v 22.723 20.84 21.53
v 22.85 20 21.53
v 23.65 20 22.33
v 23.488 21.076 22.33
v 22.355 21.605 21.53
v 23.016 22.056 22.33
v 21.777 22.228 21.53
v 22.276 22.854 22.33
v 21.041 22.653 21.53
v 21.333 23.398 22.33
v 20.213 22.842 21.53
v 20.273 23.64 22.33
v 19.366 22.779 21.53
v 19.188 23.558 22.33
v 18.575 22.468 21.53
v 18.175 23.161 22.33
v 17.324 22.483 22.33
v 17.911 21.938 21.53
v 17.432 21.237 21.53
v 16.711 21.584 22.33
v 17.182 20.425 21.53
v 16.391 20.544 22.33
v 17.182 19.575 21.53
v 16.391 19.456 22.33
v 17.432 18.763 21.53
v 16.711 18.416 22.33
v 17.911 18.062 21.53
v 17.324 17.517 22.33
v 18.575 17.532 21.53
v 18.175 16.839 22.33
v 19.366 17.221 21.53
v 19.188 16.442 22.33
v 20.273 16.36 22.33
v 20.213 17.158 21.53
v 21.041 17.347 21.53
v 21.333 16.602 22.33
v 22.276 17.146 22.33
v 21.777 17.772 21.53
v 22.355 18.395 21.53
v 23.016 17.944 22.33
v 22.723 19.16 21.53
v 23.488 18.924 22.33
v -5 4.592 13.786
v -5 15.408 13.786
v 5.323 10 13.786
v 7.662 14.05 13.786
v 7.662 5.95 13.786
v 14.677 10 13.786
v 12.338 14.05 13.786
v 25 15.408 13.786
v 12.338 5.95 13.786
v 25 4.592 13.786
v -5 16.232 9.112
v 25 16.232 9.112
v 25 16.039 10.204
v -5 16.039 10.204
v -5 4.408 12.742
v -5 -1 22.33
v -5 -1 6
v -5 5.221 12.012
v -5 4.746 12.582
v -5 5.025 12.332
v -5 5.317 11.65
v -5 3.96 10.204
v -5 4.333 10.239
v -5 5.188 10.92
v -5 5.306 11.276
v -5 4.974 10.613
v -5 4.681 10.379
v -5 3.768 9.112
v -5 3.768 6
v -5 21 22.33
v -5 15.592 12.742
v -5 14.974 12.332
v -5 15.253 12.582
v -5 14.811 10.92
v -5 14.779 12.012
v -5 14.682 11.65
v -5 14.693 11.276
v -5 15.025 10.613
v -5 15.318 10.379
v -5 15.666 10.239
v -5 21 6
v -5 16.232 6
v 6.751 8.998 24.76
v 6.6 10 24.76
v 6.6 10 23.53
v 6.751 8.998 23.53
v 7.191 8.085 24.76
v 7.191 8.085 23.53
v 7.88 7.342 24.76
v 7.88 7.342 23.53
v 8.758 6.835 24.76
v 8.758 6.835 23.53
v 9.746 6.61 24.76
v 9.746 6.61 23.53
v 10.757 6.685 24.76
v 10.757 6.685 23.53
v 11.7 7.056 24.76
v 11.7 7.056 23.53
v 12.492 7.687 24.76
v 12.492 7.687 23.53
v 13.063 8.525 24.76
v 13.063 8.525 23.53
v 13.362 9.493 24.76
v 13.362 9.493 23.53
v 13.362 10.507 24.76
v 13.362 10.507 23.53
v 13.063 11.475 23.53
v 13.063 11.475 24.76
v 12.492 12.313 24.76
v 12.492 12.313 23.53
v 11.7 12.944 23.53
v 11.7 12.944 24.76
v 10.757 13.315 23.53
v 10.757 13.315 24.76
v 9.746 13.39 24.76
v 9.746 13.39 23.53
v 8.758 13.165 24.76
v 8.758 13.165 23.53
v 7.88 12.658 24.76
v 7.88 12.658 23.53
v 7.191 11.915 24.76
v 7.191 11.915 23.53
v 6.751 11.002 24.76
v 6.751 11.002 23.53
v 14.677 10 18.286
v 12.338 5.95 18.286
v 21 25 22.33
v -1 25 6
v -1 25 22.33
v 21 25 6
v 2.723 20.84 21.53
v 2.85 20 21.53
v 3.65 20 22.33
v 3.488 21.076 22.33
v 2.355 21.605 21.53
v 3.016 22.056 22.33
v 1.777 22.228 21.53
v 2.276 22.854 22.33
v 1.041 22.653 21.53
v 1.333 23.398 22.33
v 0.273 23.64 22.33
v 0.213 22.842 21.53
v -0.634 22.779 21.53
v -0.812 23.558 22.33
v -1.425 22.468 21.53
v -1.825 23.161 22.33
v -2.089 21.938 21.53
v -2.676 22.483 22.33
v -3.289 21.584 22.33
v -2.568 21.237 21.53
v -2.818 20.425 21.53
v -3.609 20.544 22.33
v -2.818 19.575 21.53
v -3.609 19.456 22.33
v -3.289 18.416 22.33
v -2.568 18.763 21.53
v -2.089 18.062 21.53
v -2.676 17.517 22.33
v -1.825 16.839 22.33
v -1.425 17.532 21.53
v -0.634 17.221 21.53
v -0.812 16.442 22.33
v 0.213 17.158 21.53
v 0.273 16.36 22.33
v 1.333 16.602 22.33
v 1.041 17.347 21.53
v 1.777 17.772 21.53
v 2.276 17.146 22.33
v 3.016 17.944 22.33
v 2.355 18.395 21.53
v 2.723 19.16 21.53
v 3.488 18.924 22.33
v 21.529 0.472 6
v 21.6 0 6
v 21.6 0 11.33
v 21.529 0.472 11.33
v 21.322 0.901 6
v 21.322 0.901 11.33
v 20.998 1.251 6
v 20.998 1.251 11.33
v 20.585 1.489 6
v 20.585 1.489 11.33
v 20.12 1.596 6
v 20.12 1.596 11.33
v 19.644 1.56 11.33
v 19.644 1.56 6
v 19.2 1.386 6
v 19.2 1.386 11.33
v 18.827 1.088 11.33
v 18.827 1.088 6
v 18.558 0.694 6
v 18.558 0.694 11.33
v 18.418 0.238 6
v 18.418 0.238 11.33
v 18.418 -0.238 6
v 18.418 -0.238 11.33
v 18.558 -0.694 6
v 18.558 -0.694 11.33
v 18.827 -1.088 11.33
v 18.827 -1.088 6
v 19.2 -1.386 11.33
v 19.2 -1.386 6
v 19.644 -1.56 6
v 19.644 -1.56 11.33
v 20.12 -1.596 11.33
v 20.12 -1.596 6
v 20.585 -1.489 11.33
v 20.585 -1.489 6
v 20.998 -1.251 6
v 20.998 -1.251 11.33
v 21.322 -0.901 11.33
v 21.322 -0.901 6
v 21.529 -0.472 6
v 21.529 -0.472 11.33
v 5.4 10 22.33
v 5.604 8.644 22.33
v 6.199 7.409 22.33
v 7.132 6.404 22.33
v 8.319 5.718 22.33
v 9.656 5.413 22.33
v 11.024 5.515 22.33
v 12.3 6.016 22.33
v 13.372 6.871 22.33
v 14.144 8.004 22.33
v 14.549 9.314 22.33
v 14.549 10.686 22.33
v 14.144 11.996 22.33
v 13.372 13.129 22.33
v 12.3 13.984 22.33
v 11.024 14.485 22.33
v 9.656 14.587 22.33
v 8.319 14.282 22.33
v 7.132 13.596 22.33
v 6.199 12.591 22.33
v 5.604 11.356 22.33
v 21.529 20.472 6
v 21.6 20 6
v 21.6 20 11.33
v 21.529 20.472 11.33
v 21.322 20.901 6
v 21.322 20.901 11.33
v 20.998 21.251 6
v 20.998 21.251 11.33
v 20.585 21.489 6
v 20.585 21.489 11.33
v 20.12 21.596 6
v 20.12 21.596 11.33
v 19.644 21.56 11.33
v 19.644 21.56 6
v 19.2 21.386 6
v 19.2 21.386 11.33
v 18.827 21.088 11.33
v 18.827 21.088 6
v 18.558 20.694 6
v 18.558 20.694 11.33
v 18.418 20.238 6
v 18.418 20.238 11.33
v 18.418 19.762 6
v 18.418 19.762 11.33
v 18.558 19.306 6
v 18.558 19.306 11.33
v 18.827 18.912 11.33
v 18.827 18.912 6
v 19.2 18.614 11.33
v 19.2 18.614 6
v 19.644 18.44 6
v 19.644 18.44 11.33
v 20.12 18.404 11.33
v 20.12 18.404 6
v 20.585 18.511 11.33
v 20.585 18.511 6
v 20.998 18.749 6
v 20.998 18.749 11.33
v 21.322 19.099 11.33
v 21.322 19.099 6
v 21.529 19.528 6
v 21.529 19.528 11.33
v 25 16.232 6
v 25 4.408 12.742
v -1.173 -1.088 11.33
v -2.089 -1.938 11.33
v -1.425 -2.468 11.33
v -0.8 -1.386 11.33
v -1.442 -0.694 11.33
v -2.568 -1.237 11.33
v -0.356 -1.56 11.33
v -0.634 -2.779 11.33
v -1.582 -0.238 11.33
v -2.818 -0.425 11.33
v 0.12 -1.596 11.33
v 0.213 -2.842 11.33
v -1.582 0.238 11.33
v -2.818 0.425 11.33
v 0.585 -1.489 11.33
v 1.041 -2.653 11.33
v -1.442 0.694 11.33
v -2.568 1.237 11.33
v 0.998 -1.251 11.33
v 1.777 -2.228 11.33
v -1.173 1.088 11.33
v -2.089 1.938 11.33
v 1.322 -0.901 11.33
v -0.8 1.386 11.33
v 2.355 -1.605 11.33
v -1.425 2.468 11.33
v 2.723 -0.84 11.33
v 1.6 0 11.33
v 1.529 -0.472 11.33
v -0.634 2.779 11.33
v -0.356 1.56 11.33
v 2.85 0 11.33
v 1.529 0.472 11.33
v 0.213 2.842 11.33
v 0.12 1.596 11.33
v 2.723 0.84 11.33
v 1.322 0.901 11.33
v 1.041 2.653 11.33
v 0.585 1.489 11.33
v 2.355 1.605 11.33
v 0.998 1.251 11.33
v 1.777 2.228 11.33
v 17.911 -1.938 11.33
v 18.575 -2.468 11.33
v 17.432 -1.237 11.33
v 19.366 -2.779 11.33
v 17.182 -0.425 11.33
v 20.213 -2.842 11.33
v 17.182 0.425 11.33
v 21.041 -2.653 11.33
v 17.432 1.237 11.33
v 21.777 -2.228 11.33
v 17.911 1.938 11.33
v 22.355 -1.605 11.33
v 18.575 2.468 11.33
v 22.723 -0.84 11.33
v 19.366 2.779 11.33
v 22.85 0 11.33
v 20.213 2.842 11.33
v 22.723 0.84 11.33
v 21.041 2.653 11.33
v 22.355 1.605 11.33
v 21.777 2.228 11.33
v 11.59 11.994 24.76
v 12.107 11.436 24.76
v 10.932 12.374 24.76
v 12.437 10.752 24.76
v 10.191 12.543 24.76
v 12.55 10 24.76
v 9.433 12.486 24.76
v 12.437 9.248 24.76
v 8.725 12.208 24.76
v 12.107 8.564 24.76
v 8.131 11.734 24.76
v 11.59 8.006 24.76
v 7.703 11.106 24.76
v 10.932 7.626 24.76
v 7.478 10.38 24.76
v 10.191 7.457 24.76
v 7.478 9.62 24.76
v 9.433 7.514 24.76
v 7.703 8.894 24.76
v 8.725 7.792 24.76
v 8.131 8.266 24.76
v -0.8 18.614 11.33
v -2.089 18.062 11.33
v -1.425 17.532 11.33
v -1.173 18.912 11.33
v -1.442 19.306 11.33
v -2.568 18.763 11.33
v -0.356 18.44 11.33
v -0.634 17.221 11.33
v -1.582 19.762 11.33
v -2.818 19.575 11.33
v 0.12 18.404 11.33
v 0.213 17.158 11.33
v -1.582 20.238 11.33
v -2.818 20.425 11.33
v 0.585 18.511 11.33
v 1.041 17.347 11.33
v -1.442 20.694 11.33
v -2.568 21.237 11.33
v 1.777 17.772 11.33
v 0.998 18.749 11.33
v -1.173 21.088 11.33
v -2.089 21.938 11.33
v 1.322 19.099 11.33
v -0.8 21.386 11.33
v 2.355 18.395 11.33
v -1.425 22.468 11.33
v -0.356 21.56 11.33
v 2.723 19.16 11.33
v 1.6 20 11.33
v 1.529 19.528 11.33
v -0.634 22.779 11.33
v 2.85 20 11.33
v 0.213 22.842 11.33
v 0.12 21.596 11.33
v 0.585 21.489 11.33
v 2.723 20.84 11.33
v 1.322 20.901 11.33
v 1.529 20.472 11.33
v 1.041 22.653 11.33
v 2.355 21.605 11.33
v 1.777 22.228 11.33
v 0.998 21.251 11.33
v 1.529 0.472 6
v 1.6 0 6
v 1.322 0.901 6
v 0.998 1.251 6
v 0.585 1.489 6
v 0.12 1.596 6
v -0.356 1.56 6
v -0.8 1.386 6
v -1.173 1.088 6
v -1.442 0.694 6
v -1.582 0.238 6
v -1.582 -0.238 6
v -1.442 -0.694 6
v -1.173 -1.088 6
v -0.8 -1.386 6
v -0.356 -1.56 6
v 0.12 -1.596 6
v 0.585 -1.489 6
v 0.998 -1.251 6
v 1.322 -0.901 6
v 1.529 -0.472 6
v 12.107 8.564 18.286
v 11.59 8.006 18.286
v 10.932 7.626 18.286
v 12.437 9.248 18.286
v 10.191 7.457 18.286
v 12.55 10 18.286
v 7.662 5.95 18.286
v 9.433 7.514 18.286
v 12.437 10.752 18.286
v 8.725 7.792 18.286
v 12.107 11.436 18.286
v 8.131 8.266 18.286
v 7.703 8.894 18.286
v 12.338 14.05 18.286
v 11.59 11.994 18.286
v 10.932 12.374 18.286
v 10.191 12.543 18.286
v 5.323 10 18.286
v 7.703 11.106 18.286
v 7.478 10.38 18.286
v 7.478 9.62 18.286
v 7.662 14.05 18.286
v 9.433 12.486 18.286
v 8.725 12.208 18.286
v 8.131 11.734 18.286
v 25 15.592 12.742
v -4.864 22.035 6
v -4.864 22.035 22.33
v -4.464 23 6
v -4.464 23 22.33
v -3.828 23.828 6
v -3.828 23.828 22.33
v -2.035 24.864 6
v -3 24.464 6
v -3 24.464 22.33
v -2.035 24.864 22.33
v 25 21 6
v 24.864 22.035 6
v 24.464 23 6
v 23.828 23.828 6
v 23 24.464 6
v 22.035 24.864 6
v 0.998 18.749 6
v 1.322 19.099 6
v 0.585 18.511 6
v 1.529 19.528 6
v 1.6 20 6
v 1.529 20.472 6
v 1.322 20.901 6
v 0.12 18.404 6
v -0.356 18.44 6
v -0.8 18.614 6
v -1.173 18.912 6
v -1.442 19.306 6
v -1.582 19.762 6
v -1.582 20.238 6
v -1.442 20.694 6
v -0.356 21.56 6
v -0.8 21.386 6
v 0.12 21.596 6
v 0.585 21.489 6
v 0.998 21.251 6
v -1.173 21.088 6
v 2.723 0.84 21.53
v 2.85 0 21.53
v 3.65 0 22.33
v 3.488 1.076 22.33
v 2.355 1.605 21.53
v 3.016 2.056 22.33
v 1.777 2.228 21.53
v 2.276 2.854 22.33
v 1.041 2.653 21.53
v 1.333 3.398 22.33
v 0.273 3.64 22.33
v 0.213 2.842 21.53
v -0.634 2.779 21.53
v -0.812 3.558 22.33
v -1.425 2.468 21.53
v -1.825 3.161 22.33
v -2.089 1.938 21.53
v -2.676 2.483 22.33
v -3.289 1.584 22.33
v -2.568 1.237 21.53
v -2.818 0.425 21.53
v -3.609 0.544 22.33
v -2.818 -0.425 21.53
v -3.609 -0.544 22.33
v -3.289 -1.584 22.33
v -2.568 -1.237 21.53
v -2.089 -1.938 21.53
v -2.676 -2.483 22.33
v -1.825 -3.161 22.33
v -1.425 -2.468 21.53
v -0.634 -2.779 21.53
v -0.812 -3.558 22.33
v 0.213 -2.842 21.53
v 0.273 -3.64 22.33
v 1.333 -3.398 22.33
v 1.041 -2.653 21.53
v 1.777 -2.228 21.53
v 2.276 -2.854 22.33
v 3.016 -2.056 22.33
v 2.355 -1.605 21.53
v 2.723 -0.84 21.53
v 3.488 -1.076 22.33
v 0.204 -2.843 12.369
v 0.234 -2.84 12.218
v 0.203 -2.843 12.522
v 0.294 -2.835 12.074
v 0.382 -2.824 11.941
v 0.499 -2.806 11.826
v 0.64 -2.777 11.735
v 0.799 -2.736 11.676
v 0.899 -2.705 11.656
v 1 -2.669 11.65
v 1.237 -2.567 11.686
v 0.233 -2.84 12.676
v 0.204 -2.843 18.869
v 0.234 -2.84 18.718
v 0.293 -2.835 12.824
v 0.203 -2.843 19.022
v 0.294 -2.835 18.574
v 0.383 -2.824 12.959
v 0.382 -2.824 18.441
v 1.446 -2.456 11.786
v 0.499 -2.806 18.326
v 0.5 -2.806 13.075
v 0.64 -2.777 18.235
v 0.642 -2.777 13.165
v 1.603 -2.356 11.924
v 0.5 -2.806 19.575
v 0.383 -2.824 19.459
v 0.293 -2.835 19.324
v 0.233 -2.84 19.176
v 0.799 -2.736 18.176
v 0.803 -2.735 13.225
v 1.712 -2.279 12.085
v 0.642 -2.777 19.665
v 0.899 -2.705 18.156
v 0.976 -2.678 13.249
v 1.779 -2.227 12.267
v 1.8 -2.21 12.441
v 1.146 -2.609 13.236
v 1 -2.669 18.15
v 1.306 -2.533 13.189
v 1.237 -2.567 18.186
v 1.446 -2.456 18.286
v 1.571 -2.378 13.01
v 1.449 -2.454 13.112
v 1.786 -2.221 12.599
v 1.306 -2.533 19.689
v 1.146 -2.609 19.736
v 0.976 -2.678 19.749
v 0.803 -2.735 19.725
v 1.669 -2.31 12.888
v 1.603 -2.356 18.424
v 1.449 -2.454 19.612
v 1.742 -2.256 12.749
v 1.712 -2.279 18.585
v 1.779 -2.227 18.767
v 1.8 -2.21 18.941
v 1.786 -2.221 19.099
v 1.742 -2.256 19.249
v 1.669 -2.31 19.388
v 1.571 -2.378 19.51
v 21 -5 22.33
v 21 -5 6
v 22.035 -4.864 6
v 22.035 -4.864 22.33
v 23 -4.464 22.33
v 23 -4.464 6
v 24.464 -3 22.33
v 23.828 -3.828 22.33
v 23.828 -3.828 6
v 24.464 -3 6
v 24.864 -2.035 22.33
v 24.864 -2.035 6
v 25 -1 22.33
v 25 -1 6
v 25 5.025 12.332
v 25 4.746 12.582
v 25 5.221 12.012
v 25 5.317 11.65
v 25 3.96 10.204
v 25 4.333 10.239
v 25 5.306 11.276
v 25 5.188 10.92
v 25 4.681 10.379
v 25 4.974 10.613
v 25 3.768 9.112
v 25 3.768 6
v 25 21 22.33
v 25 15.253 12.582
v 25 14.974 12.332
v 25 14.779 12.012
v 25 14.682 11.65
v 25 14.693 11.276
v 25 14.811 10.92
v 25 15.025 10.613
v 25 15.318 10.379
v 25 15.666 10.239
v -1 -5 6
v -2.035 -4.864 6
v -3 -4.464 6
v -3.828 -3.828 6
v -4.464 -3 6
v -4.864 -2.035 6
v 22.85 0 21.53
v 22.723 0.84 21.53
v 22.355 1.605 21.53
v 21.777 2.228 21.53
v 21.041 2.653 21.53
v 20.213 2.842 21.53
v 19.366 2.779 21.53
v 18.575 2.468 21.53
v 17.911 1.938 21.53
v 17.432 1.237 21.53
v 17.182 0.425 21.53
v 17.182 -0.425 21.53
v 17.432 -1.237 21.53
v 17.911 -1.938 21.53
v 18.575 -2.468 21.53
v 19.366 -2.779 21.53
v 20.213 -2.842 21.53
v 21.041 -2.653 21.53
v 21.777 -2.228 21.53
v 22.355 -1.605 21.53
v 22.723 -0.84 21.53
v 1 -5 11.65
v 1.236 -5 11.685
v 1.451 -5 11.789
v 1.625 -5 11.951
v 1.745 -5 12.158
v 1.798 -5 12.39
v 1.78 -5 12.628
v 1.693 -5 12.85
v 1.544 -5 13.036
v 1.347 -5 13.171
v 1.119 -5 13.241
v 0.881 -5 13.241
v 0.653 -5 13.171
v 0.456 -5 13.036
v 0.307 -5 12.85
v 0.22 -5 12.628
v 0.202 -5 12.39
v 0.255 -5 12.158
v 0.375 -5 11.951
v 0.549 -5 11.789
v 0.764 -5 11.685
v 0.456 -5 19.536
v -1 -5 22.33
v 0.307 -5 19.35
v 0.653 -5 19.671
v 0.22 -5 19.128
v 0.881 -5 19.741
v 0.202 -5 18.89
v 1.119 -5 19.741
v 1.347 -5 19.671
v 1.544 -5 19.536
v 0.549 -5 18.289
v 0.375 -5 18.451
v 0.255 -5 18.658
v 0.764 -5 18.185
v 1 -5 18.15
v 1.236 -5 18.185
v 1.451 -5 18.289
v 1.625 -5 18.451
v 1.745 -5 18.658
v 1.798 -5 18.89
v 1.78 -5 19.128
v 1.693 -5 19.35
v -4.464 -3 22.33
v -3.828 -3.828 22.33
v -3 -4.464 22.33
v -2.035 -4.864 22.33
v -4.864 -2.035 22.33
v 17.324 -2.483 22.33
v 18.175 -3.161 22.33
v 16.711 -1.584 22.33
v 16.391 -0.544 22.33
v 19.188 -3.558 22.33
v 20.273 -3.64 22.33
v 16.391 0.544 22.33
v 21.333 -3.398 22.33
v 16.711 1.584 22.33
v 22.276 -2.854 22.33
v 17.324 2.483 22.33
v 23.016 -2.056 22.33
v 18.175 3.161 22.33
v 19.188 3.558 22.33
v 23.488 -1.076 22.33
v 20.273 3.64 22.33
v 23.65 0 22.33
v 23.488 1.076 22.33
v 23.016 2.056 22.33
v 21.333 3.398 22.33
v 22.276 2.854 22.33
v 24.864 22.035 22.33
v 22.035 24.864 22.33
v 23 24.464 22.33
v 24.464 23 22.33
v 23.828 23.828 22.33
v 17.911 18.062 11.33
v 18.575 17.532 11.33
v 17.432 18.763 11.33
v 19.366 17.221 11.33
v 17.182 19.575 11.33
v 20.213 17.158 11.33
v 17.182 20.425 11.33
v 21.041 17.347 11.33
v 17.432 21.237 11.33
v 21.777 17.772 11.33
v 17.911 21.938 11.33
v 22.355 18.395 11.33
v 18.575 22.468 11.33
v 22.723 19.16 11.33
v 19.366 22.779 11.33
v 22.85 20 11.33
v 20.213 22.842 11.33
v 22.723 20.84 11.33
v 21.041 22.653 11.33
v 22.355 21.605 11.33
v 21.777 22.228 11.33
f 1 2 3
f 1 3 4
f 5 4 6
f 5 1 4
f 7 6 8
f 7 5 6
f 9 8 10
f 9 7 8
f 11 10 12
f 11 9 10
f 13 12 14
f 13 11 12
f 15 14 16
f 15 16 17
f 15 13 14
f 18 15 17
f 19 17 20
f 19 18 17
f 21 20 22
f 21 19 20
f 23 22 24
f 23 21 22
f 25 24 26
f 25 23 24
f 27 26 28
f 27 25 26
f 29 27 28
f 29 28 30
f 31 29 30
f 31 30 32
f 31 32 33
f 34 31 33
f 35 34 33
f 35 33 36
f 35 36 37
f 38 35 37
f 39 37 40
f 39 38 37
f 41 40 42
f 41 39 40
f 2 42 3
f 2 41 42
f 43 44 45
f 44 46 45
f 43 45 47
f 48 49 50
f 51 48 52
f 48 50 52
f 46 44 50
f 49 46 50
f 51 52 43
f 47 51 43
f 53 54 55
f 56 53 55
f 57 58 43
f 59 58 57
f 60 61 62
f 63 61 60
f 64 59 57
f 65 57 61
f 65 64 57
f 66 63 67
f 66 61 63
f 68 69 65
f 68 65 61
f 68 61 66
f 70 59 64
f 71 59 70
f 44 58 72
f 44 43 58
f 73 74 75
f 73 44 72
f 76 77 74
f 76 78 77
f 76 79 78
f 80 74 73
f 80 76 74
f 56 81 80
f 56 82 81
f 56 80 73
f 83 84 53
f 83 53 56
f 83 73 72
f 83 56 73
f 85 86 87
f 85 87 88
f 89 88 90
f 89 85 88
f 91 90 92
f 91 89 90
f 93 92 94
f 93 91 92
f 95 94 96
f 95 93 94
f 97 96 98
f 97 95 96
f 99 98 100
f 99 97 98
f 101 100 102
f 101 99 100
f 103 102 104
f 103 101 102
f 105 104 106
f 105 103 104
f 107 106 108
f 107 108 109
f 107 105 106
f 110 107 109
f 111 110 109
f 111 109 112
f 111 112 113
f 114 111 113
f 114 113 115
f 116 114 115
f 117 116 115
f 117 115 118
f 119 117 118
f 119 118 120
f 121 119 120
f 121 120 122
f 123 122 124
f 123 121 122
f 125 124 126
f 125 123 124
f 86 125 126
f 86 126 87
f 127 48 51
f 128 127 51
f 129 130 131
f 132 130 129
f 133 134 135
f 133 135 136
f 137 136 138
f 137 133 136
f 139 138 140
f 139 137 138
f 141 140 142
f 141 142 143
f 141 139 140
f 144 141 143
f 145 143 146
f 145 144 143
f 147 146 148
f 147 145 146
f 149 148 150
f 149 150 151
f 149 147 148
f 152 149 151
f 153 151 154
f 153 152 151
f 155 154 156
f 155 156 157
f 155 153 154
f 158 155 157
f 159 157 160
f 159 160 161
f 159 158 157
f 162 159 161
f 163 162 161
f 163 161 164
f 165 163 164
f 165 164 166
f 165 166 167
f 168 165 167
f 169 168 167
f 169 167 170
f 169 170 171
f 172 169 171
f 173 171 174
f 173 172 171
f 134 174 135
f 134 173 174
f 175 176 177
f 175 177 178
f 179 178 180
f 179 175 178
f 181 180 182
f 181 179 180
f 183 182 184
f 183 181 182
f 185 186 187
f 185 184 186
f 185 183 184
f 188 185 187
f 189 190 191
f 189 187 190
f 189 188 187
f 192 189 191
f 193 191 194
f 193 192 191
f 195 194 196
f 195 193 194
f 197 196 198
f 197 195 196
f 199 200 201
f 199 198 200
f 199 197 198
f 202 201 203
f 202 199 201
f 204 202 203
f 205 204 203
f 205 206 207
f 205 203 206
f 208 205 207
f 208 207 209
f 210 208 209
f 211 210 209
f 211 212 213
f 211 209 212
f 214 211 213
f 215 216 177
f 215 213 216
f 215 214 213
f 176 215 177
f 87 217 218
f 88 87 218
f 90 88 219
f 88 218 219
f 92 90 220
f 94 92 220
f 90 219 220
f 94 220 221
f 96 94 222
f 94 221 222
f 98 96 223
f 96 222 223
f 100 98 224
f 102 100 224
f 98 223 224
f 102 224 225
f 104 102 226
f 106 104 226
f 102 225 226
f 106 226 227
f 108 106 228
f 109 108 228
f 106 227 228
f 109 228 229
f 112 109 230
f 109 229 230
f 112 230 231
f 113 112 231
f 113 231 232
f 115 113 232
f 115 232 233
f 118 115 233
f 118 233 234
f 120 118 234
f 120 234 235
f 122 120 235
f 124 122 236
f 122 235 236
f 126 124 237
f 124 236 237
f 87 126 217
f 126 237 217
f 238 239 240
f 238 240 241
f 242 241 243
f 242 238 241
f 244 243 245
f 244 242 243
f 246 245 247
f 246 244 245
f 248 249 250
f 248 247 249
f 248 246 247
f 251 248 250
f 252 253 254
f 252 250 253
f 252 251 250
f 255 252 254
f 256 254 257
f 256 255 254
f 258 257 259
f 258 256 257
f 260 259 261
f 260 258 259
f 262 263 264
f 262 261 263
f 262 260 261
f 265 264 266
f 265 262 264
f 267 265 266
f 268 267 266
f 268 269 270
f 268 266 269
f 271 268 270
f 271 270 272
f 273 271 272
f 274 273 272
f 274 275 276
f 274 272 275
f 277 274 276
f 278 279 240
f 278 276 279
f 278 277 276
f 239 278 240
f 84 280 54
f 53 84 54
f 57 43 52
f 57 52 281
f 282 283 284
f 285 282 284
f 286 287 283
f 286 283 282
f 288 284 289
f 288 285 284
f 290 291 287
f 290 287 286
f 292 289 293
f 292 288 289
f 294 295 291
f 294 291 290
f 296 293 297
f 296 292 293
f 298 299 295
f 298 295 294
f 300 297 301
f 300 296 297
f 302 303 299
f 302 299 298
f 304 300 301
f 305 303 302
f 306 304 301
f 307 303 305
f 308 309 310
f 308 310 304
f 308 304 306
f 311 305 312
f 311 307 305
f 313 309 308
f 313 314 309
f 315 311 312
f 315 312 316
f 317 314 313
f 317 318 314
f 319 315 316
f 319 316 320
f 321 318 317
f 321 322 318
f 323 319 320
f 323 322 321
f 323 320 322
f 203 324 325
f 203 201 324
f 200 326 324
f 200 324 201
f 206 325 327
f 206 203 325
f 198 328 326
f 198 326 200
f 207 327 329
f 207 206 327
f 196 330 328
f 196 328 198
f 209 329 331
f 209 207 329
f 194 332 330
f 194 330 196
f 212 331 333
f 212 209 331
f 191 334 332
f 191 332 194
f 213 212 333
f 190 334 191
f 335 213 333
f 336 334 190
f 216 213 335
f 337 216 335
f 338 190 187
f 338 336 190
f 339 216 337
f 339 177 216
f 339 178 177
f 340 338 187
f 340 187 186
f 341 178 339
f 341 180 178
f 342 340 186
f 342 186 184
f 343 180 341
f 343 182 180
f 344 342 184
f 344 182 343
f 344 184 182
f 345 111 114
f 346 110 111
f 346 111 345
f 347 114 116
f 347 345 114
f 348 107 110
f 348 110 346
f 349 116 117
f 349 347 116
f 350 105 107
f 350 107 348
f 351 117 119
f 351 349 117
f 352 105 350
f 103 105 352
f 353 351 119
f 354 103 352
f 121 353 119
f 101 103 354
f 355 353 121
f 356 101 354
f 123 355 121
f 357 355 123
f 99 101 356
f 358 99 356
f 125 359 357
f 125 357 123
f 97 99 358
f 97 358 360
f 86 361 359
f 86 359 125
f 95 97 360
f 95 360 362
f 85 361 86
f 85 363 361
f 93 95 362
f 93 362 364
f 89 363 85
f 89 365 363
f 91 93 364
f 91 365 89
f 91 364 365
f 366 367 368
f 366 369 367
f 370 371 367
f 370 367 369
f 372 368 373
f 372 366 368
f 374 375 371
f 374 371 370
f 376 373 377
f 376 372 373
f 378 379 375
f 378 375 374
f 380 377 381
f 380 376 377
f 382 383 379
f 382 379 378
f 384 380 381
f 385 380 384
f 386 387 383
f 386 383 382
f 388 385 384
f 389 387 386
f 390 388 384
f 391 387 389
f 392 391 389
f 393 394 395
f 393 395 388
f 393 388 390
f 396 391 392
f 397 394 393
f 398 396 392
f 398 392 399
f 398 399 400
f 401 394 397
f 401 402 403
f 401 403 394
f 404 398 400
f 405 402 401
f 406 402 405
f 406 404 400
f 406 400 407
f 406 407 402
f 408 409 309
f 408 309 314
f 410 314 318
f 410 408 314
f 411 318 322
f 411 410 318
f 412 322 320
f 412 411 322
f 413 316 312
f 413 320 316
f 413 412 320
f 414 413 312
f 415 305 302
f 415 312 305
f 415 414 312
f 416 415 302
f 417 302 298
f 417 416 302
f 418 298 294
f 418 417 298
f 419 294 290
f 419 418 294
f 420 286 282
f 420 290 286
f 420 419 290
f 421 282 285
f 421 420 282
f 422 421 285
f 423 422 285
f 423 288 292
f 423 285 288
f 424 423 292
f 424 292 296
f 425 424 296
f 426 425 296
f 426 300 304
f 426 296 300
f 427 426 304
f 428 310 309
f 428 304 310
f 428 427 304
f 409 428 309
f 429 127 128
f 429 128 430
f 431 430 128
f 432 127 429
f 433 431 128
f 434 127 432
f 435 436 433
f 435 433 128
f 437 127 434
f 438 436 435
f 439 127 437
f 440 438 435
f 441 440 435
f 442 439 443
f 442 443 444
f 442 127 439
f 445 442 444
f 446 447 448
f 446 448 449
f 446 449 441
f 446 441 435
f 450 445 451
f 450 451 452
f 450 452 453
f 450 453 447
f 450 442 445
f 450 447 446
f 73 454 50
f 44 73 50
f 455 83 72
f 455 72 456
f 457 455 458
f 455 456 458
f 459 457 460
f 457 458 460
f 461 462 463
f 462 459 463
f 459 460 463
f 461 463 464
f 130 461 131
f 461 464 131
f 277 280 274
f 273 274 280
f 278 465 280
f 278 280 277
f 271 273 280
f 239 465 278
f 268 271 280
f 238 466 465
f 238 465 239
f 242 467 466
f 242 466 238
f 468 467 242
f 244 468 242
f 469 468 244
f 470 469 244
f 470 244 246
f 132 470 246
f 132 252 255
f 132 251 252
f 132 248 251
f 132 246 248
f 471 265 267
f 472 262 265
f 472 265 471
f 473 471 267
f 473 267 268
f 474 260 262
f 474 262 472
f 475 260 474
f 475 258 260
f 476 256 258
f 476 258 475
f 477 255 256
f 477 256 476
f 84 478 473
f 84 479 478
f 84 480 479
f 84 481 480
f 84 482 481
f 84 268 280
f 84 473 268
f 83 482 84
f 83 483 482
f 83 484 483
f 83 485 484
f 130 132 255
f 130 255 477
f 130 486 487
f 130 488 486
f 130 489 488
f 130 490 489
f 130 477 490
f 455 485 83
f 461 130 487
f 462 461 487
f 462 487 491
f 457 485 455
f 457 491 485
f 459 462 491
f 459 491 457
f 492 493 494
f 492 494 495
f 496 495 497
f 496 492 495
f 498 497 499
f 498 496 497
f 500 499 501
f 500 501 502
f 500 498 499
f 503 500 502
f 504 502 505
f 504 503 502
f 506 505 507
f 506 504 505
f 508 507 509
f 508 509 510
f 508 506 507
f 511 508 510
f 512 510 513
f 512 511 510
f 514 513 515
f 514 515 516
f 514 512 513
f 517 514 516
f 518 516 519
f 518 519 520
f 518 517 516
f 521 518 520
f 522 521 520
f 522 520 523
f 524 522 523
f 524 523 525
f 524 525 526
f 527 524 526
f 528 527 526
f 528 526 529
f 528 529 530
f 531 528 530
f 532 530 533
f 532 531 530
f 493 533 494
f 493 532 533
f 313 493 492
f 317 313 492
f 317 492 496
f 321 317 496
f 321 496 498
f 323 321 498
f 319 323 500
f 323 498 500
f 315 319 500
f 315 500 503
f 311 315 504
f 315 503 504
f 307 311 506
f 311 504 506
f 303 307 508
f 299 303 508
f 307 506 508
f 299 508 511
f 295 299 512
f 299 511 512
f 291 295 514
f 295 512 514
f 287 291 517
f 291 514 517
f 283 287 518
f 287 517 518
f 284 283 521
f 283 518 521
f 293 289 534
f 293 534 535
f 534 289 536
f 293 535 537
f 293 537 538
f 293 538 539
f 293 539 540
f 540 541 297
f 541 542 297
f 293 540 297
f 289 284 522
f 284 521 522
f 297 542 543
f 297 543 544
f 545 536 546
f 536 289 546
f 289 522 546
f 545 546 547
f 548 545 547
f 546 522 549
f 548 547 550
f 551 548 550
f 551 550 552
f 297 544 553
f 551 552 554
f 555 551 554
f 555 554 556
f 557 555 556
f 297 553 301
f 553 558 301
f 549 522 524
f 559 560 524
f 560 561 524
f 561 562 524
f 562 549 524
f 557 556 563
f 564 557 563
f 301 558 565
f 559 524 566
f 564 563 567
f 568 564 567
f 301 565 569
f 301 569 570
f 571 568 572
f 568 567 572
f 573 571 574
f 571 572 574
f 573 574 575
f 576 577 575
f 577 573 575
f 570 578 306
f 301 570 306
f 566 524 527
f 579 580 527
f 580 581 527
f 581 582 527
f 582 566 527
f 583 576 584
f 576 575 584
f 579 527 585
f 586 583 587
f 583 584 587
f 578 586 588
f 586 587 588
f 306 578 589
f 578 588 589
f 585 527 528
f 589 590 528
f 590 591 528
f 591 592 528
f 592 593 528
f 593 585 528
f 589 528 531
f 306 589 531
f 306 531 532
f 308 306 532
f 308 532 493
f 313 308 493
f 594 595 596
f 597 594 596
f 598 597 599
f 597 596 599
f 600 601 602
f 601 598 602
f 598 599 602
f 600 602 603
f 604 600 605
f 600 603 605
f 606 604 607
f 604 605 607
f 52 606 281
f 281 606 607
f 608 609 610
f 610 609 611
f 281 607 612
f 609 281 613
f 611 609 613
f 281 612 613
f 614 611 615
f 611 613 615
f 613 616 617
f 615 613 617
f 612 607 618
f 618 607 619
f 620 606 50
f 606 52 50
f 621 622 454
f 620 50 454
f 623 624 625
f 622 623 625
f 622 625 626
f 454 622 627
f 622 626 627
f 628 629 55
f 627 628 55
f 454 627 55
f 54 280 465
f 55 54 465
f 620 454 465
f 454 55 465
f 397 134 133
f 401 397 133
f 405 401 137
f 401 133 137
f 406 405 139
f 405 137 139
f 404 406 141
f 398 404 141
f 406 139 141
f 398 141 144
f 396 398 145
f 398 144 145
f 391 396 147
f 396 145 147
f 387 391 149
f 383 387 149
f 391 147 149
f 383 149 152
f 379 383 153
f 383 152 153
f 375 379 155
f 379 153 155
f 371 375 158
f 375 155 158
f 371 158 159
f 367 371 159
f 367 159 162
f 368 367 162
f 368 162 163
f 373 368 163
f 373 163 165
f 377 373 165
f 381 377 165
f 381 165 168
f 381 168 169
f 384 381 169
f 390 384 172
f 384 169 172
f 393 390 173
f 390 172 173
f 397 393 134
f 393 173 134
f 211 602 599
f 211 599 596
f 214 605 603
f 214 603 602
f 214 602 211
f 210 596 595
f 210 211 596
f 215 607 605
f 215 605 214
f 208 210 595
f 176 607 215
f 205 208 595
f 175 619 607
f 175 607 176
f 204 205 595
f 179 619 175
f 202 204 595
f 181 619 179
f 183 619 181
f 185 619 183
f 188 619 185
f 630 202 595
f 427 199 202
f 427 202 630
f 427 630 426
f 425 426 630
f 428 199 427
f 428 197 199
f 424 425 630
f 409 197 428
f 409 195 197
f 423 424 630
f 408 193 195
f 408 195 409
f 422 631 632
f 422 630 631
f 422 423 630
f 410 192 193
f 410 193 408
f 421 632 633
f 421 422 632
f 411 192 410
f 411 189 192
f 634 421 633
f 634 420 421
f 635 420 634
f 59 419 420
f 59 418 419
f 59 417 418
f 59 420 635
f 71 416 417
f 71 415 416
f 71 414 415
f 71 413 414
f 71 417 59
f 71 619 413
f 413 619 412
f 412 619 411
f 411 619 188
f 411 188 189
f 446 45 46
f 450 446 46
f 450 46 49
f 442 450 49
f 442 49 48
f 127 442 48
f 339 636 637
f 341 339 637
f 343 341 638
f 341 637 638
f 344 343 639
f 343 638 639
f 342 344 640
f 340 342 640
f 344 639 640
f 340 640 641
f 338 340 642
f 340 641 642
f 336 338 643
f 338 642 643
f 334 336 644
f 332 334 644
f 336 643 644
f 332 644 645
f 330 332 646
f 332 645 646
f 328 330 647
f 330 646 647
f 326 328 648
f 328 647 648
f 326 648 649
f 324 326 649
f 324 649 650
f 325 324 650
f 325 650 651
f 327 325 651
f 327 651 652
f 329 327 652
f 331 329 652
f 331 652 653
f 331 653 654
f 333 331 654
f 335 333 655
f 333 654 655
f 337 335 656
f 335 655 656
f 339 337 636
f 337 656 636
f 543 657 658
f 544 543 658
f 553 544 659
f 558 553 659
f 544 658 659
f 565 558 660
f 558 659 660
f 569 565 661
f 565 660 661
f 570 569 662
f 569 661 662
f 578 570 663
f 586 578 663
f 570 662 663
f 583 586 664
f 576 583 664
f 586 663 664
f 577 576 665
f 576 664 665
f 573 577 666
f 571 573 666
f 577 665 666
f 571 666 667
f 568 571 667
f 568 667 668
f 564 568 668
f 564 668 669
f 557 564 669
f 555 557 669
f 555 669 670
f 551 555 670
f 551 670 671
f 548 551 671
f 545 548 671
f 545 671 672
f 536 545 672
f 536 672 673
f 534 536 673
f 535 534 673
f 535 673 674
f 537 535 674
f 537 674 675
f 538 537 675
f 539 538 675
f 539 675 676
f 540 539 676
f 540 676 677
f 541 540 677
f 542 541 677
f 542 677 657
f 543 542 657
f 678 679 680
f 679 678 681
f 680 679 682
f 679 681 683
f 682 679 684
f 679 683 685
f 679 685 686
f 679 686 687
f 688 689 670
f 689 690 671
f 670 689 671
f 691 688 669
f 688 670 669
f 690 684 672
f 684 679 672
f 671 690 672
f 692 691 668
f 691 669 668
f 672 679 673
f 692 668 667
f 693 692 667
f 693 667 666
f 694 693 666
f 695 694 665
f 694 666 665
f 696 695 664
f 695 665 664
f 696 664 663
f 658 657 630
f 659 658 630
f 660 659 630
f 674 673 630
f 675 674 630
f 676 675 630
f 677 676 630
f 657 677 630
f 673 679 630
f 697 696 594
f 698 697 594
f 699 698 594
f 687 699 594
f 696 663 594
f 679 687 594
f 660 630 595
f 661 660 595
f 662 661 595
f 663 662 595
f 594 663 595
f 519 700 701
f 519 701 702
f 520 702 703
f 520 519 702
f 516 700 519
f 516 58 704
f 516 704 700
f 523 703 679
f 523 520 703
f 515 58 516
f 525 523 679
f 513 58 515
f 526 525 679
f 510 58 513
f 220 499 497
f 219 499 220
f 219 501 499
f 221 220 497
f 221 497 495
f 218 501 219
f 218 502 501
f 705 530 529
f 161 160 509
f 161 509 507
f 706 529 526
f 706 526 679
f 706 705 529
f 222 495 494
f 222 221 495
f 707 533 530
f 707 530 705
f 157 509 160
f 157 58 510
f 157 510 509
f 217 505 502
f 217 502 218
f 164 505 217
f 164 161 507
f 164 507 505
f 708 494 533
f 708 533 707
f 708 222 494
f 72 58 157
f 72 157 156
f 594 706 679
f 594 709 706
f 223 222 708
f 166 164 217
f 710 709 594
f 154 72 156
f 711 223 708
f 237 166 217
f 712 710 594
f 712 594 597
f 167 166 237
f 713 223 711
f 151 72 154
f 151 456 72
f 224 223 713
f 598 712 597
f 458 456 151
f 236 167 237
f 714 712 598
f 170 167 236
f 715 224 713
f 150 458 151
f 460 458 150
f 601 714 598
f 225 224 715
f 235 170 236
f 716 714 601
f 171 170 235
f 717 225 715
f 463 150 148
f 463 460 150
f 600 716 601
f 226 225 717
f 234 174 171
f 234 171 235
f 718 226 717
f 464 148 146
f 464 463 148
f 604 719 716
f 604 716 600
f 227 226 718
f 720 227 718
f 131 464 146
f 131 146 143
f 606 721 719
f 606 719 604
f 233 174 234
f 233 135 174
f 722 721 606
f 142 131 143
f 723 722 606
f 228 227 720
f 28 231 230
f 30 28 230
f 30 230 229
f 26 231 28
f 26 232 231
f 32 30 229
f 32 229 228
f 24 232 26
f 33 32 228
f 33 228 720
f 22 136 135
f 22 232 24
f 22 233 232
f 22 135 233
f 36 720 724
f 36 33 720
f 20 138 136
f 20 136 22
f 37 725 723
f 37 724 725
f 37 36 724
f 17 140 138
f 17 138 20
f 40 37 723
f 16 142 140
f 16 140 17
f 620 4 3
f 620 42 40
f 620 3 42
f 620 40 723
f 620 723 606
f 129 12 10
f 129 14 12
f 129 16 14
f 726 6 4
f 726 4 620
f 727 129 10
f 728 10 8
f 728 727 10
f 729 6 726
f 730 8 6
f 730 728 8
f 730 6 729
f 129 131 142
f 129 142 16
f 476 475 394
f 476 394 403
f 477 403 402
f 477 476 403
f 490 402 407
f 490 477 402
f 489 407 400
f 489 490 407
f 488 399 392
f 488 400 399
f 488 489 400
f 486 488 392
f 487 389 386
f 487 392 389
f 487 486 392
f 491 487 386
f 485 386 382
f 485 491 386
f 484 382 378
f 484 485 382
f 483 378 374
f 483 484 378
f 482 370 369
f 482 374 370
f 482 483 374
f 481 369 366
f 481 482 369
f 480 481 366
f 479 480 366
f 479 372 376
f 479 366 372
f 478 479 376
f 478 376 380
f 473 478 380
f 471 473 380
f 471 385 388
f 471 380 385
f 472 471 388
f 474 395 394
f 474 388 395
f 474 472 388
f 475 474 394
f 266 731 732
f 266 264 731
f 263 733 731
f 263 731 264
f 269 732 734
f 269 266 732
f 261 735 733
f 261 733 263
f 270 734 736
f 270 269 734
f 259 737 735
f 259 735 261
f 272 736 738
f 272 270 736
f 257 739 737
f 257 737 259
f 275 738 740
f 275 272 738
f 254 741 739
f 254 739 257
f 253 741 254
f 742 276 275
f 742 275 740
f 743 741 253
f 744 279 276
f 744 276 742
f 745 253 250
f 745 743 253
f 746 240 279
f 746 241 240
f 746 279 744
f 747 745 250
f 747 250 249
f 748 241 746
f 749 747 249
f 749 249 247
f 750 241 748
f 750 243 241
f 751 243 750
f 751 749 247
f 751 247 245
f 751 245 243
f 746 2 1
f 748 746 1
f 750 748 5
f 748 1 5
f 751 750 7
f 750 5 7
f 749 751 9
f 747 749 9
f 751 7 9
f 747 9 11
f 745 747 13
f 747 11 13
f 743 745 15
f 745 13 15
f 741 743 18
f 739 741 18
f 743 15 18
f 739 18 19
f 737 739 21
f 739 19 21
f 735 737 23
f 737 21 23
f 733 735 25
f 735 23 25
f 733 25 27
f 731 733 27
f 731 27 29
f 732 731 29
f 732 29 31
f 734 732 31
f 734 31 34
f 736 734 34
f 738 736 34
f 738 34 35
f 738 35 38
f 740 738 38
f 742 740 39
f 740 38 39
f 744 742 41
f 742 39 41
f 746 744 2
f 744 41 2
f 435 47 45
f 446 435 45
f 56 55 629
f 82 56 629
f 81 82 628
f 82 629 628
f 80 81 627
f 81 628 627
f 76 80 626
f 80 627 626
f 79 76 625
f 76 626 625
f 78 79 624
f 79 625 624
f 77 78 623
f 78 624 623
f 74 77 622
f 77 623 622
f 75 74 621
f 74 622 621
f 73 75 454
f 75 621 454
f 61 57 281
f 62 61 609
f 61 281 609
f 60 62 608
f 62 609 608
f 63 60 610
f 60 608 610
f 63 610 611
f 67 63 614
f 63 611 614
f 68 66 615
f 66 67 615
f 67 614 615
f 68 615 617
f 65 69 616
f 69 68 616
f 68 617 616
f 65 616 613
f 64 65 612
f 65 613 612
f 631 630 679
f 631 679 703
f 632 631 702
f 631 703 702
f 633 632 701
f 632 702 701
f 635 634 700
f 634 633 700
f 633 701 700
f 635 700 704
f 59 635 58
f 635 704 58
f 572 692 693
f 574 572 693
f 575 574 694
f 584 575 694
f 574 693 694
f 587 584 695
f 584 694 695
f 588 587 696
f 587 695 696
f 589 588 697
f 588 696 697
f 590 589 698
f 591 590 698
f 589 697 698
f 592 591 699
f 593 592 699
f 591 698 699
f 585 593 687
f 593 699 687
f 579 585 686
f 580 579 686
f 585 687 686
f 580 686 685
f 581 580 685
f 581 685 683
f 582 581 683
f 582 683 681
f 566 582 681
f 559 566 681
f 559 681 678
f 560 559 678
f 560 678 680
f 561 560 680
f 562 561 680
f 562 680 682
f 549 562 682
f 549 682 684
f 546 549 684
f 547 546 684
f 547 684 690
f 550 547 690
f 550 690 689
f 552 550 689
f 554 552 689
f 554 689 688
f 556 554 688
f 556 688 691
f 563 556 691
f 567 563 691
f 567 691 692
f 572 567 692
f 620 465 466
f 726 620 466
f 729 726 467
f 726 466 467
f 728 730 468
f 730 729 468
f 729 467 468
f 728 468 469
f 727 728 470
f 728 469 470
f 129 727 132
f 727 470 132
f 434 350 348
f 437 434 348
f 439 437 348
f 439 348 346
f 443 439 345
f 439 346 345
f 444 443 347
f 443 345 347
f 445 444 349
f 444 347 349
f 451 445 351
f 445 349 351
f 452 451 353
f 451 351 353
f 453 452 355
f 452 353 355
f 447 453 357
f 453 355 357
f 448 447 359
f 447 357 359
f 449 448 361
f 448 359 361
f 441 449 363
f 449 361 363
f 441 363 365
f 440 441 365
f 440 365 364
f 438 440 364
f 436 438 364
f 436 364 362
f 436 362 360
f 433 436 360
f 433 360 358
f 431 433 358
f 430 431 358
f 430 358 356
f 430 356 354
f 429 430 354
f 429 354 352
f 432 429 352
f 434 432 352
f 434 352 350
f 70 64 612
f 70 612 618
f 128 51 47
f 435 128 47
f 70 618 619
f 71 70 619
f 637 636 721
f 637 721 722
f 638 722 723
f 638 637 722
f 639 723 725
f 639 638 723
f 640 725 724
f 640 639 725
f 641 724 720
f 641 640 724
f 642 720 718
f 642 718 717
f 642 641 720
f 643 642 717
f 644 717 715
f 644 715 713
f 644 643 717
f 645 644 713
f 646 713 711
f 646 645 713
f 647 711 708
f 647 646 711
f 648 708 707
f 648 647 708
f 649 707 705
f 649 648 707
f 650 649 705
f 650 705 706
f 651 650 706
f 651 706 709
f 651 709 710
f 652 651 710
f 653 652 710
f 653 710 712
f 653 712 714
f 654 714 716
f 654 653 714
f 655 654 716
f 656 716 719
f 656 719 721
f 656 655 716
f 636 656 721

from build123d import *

# Parameters (mm, degrees)
SKETCH1_W                  = 30
SKETCH1_H                  = 30
SKETCH1_R                  = 1.6
SKETCH1_W_2                = 70
SKETCH1_H_2                = 12
BOSS_EXTRUDE1_DEPTH        = 6
SKETCH1_3_W                = 30
SKETCH1_3_H                = 30
SKETCH1_3_R                = 1.6
BOSS_EXTRUDE2_DEPTH        = 22.33
CUT_EXTRUDE1_DEPTH         = 78.612040947
SKETCH3_R                  = 2.55
CUT_EXTRUDE2_DEPTH         = 8
CUT_EXTRUDE3_DEPTH         = 4.5
SKETCH6_R                  = 5
CUT_EXTRUDE5_DEPTH         = 8.6
SKETCH7_R                  = 1.6
CUT_EXTRUDE6_DEPTH         = 101.740403513
SKETCH8_R                  = 2.85
CUT_EXTRUDE7_DEPTH         = 11
BOSS_EXTRUDE3_START        = 2.43
SKETCH9_R                  = 3.4
SKETCH9_R_2                = 2.55
BOSS_EXTRUDE3_DEPTH        = 2.43
CHAMFER1_SIZE              = 1.2
FILLET3_R                  = 4
CHAMFER2_SIZE              = 0.8
CUT_EXTRUDE8_DEPTH         = 3
CHAMFER3_SIZE              = 0.8
LPATTERN1_COUNT            = 3
LPATTERN1_PITCH            = 25
CHAMFER3_OF_LPATTERN1_SIZE = 0.8
SKETCH12_W                 = 103.210606925
SKETCH12_H                 = 33.832940417
CUT_EXTRUDE9_DEPTH         = 6
SKETCH13_R                 = 0.8
CUT_EXTRUDE10_DEPTH        = 5


with BuildPart() as part:
    # Sketch1 → Boss-Extrude1 (new body)
    # profile 1 of 2: a face of its own
    with BuildSketch(Plane.XY):
        with Locations((10, 10)):
            Rectangle(SKETCH1_W, SKETCH1_H)
        with Locations((20, 0)):
            Circle(SKETCH1_R, mode=Mode.SUBTRACT)
        with Locations((20, 20)):
            Circle(SKETCH1_R, mode=Mode.SUBTRACT)
        with Locations((0, 20)):
            Circle(SKETCH1_R, mode=Mode.SUBTRACT)
        Circle(SKETCH1_R, mode=Mode.SUBTRACT)
    # profile 2 of 2: a face of its own
    with BuildSketch(Plane.XY):
        with Locations((60, 10)):
            Rectangle(SKETCH1_W_2, SKETCH1_H_2)
    extrude(amount=BOSS_EXTRUDE1_DEPTH)

    # Sketch1<3> → Boss-Extrude2 (add)
    with BuildSketch(Plane.XY):
        with Locations((10, 10)):
            Rectangle(SKETCH1_3_W, SKETCH1_3_H)
        with Locations((20, 0)):
            Circle(SKETCH1_3_R, mode=Mode.SUBTRACT)
        with Locations((20, 20)):
            Circle(SKETCH1_3_R, mode=Mode.SUBTRACT)
        with Locations((0, 20)):
            Circle(SKETCH1_3_R, mode=Mode.SUBTRACT)
        Circle(SKETCH1_3_R, mode=Mode.SUBTRACT)
    extrude(amount=BOSS_EXTRUDE2_DEPTH)

    # Sketch2 → Cut-Extrude1 (cut, through all)
    with BuildSketch(Plane(origin=(25, 0, 0), x_dir=(0, 0, -1), z_dir=(1, 0, 0))):
        with BuildLine():
            Line((-6.515476918, 16.231667643), (-9.112158418, 16.231667643))
            Line((-9.112158418, 16.231667643), (-10.20449761, 16.039058771))
            ThreePointArc((-10.20449761, 16.039058771), (-11.275650893, 14.693383456), (-12.742453793, 15.59154862))
            Line((-12.742453793, 15.59154862), (-13.786185118, 15.407510627))
            Line((-13.786185118, 15.407510627), (-13.786185118, 4.591753459))
            Line((-13.786185118, 4.591753459), (-12.742453793, 4.407715465))
            ThreePointArc((-12.742453793, 4.407715465), (-11.275650893, 5.305880629), (-10.20449761, 3.960205314))
            Line((-10.20449761, 3.960205314), (-9.112158418, 3.767596443))
            Line((-9.112158418, 3.767596443), (-6.515476918, 3.767596443))
            Line((-6.515476918, 3.767596443), (-5.902540869, 3.767596443))
            Line((-5.902540869, 3.767596443), (-5.902540869, 16.231667643))
            Line((-5.902540869, 16.231667643), (-6.515476918, 16.231667643))
        make_face()
    extrude(amount=-CUT_EXTRUDE1_DEPTH, mode=Mode.SUBTRACT)

    # Sketch3 → Cut-Extrude2 (cut)
    with BuildSketch(Plane.XY.offset(22.33)):
        with Locations((10, 10)):
            Circle(SKETCH3_R)
    extrude(amount=-CUT_EXTRUDE2_DEPTH, mode=Mode.SUBTRACT)

    # Sketch5 → Cut-Extrude3 (cut)
    with BuildSketch(Plane(origin=(0, 0, 13.786185118), x_dir=(-1, 0, 0), z_dir=(0, 0, -1))):
        Polygon((-5.32346282, 10), (-7.66173141, 14.05), (-12.33826859, 14.05), (-14.67653718, 10), (-12.33826859, 5.95), (-7.66173141, 5.95), align=None)
    extrude(amount=-CUT_EXTRUDE3_DEPTH, mode=Mode.SUBTRACT)

    # Sketch6 → Cut-Extrude5 (cut)
    with BuildSketch(Plane(origin=(0, 0, 0), x_dir=(-1, 0, 0), z_dir=(0, 0, -1))):
        with Locations((-10, 10)):
            Circle(SKETCH6_R)
    extrude(amount=-CUT_EXTRUDE5_DEPTH, mode=Mode.SUBTRACT)

    # Sketch7 → Cut-Extrude6 (cut, through all)
    with BuildSketch(Plane(origin=(0, 0, 0), x_dir=(-1, 0, 0), z_dir=(0, 0, -1))):
        with BuildLine():
            ThreePointArc((-90.1, 10), (-88.5, 8.4), (-86.9, 10))
            Line((-86.9, 10), (-90.1, 10))
        make_face()
        with BuildLine():
            Line((-90.1, 10), (-86.9, 10))
            ThreePointArc((-86.9, 10), (-88.5, 11.6), (-90.1, 10))
        make_face()
        with Locations((-63.5, 10)):
            Circle(SKETCH7_R)
        with Locations((-38.5, 10)):
            Circle(SKETCH7_R)
    extrude(amount=-CUT_EXTRUDE6_DEPTH, mode=Mode.SUBTRACT)

    # Sketch8 → Cut-Extrude7 (cut)
    with BuildSketch(Plane.XY.offset(22.33)):
        with Locations((20, 20)):
            Circle(SKETCH8_R)
        with Locations((20, 0)):
            Circle(SKETCH8_R)
        Circle(SKETCH8_R)
        with Locations((0, 20)):
            Circle(SKETCH8_R)
    extrude(amount=-CUT_EXTRUDE7_DEPTH, mode=Mode.SUBTRACT)

    # Sketch9 → Boss-Extrude3 (add)
    with BuildSketch(Plane.XY.offset(22.33).offset(BOSS_EXTRUDE3_START)):
        with Locations(Location((10, 10, 0), (0, 0, 180))):
            Circle(SKETCH9_R)
        with Locations((10, 10)):
            Circle(SKETCH9_R_2, mode=Mode.SUBTRACT)
    extrude(amount=-BOSS_EXTRUDE3_DEPTH)

    # Chamfer1
    chamfer1_edges = [part.edges().sort_by_distance(p)[0] for p in [
        (13.4, 10, 22.33),
    ]]
    chamfer(chamfer1_edges, length=CHAMFER1_SIZE)

    # Fillet3
    # the kernel refuses this fillet: 4 mm, written as the material it adds along each edge
    with BuildSketch(Plane(origin=(25, 4, 0), x_dir=(0, -1, 0), z_dir=(0, 0, 1))) as fillet3_piece_1:
        with BuildLine():
            CenterArc((FILLET3_R, FILLET3_R), FILLET3_R, 180, 90)
            Line((0, FILLET3_R), (0, 0))
            Line((0, 0), (FILLET3_R, 0))
        make_face()
    extrude(amount=5.902540869)
    with BuildSketch(Plane(origin=(25, 16, 0), x_dir=(0, 1, 0), z_dir=(0, 0, 1))) as fillet3_piece_2:
        with BuildLine():
            CenterArc((FILLET3_R, -FILLET3_R), FILLET3_R, 90, 90)
            Line((0, -FILLET3_R), (0, 0))
            Line((0, 0), (FILLET3_R, 0))
        make_face()
    extrude(amount=5.902540869)
    # the kernel refuses this fillet: 4 mm, written as the material it takes off along each edge
    with BuildSketch(Plane(origin=(-5, -5, 32.33), x_dir=(1, 0, 0), z_dir=(0, 0, -1)), Plane(origin=(-5, 25, 32.33), x_dir=(0, -1, 0), z_dir=(0, 0, -1)), Plane(origin=(25, 25, -10), x_dir=(0, -1, 0), z_dir=(0, 0, 1)), Plane(origin=(25, -5, -10), x_dir=(-1, 0, 0), z_dir=(0, 0, 1))) as fillet3_2_piece_1:
        with BuildLine():
            CenterArc((FILLET3_R, -FILLET3_R), FILLET3_R, 90, 90)
            Line((0, -FILLET3_R), (0, 0))
            Line((0, 0), (FILLET3_R, 0))
        make_face()
    extrude(amount=42.33, mode=Mode.SUBTRACT)
    with BuildSketch(Plane(origin=(95, 16, -10), x_dir=(-1, 0, 0), z_dir=(0, 0, 1))) as fillet3_2_piece_2:
        with BuildLine():
            CenterArc((FILLET3_R, FILLET3_R), FILLET3_R, 180, 90)
            Line((0, FILLET3_R), (0, 0))
            Line((0, 0), (FILLET3_R, 0))
        make_face()
    extrude(amount=26, mode=Mode.SUBTRACT)
    with BuildSketch(Plane(origin=(95, 4, -10), x_dir=(-1, 0, 0), z_dir=(0, 0, 1))) as fillet3_2_piece_3:
        with BuildLine():
            CenterArc((FILLET3_R, -FILLET3_R), FILLET3_R, 90, 90)
            Line((0, -FILLET3_R), (0, 0))
            Line((0, 0), (FILLET3_R, 0))
        make_face()
    extrude(amount=26, mode=Mode.SUBTRACT)

    # Chamfer2
    chamfer2_edges = [part.edges().sort_by_distance(p)[0] for p in [
        (-2.85, 20, 22.33),
        (-2.85, 0, 22.33),
        (17.15, 0, 22.33),
        (17.15, 20, 22.33),
    ]]
    chamfer(chamfer2_edges, length=CHAMFER2_SIZE)

    # Sketch10 → Cut-Extrude8 (cut)
    with BuildSketch(Plane(origin=(0, 0, 0), x_dir=(-1, 0, 0), z_dir=(0, 0, -1))):
        Polygon((-85.266838493, 10), (-86.883419246, 12.8), (-90.116580754, 12.8), (-91.733161507, 10), (-90.116580754, 7.2), (-86.883419246, 7.2), align=None)
    cut_extrude8 = extrude(amount=-CUT_EXTRUDE8_DEPTH, mode=Mode.SUBTRACT)

    # Chamfer3
    chamfer3_edges = [part.edges().sort_by_distance(p)[0] for p in [
        (86.075128869, 8.6, 0),
        (86.075128869, 11.4, 0),
        (88.5, 12.8, 0),
        (90.924871131, 11.4, 0),
        (90.924871131, 8.6, 0),
        (88.5, 7.2, 0),
    ]]
    chamfer(chamfer3_edges, length=CHAMFER3_SIZE)

    # LPattern1: Cut-Extrude8 ×3
    with Locations(*[(-i * LPATTERN1_PITCH, 0, 0) for i in range(1, LPATTERN1_COUNT)]):
        add(cut_extrude8, mode=Mode.SUBTRACT)

    # Chamfer3 of LPattern1
    chamfer3_of_lpattern1_edges = [part.edges().sort_by_distance(p)[0] for p in [
        (61.075128869, 8.6, 0),
        (61.075128869, 11.4, 0),
        (63.5, 12.8, 0),
        (65.924871131, 11.4, 0),
        (65.924871131, 8.6, 0),
        (63.5, 7.2, 0),
        (36.075128869, 8.6, 0),
        (36.075128869, 11.4, 0),
        (38.5, 12.8, 0),
        (40.924871131, 11.4, 0),
        (40.924871131, 8.6, 0),
        (38.5, 7.2, 0),
    ]]
    chamfer(chamfer3_of_lpattern1_edges, length=CHAMFER3_OF_LPATTERN1_SIZE)

    # Sketch12 → Cut-Extrude9 (cut)
    with BuildSketch(Plane(origin=(0, 0, 0), x_dir=(-1, 0, 0), z_dir=(0, 0, -1))):
        with Locations((-45.050346637, 9.848960088)):
            Rectangle(SKETCH12_W, SKETCH12_H)
    extrude(amount=-CUT_EXTRUDE9_DEPTH, mode=Mode.SUBTRACT)

    # Sketch13 → Cut-Extrude10 (cut)
    with BuildSketch(Plane.XZ.offset(5)):
        with Locations(Location((1, 18.949828429, 0), (0, 0, 270))):
            Circle(SKETCH13_R)
        with Locations(Location((1, 12.449828429, 0), (0, 0, 270))):
            Circle(SKETCH13_R)
    extrude(amount=-CUT_EXTRUDE10_DEPTH, mode=Mode.SUBTRACT)


solid = part.part
